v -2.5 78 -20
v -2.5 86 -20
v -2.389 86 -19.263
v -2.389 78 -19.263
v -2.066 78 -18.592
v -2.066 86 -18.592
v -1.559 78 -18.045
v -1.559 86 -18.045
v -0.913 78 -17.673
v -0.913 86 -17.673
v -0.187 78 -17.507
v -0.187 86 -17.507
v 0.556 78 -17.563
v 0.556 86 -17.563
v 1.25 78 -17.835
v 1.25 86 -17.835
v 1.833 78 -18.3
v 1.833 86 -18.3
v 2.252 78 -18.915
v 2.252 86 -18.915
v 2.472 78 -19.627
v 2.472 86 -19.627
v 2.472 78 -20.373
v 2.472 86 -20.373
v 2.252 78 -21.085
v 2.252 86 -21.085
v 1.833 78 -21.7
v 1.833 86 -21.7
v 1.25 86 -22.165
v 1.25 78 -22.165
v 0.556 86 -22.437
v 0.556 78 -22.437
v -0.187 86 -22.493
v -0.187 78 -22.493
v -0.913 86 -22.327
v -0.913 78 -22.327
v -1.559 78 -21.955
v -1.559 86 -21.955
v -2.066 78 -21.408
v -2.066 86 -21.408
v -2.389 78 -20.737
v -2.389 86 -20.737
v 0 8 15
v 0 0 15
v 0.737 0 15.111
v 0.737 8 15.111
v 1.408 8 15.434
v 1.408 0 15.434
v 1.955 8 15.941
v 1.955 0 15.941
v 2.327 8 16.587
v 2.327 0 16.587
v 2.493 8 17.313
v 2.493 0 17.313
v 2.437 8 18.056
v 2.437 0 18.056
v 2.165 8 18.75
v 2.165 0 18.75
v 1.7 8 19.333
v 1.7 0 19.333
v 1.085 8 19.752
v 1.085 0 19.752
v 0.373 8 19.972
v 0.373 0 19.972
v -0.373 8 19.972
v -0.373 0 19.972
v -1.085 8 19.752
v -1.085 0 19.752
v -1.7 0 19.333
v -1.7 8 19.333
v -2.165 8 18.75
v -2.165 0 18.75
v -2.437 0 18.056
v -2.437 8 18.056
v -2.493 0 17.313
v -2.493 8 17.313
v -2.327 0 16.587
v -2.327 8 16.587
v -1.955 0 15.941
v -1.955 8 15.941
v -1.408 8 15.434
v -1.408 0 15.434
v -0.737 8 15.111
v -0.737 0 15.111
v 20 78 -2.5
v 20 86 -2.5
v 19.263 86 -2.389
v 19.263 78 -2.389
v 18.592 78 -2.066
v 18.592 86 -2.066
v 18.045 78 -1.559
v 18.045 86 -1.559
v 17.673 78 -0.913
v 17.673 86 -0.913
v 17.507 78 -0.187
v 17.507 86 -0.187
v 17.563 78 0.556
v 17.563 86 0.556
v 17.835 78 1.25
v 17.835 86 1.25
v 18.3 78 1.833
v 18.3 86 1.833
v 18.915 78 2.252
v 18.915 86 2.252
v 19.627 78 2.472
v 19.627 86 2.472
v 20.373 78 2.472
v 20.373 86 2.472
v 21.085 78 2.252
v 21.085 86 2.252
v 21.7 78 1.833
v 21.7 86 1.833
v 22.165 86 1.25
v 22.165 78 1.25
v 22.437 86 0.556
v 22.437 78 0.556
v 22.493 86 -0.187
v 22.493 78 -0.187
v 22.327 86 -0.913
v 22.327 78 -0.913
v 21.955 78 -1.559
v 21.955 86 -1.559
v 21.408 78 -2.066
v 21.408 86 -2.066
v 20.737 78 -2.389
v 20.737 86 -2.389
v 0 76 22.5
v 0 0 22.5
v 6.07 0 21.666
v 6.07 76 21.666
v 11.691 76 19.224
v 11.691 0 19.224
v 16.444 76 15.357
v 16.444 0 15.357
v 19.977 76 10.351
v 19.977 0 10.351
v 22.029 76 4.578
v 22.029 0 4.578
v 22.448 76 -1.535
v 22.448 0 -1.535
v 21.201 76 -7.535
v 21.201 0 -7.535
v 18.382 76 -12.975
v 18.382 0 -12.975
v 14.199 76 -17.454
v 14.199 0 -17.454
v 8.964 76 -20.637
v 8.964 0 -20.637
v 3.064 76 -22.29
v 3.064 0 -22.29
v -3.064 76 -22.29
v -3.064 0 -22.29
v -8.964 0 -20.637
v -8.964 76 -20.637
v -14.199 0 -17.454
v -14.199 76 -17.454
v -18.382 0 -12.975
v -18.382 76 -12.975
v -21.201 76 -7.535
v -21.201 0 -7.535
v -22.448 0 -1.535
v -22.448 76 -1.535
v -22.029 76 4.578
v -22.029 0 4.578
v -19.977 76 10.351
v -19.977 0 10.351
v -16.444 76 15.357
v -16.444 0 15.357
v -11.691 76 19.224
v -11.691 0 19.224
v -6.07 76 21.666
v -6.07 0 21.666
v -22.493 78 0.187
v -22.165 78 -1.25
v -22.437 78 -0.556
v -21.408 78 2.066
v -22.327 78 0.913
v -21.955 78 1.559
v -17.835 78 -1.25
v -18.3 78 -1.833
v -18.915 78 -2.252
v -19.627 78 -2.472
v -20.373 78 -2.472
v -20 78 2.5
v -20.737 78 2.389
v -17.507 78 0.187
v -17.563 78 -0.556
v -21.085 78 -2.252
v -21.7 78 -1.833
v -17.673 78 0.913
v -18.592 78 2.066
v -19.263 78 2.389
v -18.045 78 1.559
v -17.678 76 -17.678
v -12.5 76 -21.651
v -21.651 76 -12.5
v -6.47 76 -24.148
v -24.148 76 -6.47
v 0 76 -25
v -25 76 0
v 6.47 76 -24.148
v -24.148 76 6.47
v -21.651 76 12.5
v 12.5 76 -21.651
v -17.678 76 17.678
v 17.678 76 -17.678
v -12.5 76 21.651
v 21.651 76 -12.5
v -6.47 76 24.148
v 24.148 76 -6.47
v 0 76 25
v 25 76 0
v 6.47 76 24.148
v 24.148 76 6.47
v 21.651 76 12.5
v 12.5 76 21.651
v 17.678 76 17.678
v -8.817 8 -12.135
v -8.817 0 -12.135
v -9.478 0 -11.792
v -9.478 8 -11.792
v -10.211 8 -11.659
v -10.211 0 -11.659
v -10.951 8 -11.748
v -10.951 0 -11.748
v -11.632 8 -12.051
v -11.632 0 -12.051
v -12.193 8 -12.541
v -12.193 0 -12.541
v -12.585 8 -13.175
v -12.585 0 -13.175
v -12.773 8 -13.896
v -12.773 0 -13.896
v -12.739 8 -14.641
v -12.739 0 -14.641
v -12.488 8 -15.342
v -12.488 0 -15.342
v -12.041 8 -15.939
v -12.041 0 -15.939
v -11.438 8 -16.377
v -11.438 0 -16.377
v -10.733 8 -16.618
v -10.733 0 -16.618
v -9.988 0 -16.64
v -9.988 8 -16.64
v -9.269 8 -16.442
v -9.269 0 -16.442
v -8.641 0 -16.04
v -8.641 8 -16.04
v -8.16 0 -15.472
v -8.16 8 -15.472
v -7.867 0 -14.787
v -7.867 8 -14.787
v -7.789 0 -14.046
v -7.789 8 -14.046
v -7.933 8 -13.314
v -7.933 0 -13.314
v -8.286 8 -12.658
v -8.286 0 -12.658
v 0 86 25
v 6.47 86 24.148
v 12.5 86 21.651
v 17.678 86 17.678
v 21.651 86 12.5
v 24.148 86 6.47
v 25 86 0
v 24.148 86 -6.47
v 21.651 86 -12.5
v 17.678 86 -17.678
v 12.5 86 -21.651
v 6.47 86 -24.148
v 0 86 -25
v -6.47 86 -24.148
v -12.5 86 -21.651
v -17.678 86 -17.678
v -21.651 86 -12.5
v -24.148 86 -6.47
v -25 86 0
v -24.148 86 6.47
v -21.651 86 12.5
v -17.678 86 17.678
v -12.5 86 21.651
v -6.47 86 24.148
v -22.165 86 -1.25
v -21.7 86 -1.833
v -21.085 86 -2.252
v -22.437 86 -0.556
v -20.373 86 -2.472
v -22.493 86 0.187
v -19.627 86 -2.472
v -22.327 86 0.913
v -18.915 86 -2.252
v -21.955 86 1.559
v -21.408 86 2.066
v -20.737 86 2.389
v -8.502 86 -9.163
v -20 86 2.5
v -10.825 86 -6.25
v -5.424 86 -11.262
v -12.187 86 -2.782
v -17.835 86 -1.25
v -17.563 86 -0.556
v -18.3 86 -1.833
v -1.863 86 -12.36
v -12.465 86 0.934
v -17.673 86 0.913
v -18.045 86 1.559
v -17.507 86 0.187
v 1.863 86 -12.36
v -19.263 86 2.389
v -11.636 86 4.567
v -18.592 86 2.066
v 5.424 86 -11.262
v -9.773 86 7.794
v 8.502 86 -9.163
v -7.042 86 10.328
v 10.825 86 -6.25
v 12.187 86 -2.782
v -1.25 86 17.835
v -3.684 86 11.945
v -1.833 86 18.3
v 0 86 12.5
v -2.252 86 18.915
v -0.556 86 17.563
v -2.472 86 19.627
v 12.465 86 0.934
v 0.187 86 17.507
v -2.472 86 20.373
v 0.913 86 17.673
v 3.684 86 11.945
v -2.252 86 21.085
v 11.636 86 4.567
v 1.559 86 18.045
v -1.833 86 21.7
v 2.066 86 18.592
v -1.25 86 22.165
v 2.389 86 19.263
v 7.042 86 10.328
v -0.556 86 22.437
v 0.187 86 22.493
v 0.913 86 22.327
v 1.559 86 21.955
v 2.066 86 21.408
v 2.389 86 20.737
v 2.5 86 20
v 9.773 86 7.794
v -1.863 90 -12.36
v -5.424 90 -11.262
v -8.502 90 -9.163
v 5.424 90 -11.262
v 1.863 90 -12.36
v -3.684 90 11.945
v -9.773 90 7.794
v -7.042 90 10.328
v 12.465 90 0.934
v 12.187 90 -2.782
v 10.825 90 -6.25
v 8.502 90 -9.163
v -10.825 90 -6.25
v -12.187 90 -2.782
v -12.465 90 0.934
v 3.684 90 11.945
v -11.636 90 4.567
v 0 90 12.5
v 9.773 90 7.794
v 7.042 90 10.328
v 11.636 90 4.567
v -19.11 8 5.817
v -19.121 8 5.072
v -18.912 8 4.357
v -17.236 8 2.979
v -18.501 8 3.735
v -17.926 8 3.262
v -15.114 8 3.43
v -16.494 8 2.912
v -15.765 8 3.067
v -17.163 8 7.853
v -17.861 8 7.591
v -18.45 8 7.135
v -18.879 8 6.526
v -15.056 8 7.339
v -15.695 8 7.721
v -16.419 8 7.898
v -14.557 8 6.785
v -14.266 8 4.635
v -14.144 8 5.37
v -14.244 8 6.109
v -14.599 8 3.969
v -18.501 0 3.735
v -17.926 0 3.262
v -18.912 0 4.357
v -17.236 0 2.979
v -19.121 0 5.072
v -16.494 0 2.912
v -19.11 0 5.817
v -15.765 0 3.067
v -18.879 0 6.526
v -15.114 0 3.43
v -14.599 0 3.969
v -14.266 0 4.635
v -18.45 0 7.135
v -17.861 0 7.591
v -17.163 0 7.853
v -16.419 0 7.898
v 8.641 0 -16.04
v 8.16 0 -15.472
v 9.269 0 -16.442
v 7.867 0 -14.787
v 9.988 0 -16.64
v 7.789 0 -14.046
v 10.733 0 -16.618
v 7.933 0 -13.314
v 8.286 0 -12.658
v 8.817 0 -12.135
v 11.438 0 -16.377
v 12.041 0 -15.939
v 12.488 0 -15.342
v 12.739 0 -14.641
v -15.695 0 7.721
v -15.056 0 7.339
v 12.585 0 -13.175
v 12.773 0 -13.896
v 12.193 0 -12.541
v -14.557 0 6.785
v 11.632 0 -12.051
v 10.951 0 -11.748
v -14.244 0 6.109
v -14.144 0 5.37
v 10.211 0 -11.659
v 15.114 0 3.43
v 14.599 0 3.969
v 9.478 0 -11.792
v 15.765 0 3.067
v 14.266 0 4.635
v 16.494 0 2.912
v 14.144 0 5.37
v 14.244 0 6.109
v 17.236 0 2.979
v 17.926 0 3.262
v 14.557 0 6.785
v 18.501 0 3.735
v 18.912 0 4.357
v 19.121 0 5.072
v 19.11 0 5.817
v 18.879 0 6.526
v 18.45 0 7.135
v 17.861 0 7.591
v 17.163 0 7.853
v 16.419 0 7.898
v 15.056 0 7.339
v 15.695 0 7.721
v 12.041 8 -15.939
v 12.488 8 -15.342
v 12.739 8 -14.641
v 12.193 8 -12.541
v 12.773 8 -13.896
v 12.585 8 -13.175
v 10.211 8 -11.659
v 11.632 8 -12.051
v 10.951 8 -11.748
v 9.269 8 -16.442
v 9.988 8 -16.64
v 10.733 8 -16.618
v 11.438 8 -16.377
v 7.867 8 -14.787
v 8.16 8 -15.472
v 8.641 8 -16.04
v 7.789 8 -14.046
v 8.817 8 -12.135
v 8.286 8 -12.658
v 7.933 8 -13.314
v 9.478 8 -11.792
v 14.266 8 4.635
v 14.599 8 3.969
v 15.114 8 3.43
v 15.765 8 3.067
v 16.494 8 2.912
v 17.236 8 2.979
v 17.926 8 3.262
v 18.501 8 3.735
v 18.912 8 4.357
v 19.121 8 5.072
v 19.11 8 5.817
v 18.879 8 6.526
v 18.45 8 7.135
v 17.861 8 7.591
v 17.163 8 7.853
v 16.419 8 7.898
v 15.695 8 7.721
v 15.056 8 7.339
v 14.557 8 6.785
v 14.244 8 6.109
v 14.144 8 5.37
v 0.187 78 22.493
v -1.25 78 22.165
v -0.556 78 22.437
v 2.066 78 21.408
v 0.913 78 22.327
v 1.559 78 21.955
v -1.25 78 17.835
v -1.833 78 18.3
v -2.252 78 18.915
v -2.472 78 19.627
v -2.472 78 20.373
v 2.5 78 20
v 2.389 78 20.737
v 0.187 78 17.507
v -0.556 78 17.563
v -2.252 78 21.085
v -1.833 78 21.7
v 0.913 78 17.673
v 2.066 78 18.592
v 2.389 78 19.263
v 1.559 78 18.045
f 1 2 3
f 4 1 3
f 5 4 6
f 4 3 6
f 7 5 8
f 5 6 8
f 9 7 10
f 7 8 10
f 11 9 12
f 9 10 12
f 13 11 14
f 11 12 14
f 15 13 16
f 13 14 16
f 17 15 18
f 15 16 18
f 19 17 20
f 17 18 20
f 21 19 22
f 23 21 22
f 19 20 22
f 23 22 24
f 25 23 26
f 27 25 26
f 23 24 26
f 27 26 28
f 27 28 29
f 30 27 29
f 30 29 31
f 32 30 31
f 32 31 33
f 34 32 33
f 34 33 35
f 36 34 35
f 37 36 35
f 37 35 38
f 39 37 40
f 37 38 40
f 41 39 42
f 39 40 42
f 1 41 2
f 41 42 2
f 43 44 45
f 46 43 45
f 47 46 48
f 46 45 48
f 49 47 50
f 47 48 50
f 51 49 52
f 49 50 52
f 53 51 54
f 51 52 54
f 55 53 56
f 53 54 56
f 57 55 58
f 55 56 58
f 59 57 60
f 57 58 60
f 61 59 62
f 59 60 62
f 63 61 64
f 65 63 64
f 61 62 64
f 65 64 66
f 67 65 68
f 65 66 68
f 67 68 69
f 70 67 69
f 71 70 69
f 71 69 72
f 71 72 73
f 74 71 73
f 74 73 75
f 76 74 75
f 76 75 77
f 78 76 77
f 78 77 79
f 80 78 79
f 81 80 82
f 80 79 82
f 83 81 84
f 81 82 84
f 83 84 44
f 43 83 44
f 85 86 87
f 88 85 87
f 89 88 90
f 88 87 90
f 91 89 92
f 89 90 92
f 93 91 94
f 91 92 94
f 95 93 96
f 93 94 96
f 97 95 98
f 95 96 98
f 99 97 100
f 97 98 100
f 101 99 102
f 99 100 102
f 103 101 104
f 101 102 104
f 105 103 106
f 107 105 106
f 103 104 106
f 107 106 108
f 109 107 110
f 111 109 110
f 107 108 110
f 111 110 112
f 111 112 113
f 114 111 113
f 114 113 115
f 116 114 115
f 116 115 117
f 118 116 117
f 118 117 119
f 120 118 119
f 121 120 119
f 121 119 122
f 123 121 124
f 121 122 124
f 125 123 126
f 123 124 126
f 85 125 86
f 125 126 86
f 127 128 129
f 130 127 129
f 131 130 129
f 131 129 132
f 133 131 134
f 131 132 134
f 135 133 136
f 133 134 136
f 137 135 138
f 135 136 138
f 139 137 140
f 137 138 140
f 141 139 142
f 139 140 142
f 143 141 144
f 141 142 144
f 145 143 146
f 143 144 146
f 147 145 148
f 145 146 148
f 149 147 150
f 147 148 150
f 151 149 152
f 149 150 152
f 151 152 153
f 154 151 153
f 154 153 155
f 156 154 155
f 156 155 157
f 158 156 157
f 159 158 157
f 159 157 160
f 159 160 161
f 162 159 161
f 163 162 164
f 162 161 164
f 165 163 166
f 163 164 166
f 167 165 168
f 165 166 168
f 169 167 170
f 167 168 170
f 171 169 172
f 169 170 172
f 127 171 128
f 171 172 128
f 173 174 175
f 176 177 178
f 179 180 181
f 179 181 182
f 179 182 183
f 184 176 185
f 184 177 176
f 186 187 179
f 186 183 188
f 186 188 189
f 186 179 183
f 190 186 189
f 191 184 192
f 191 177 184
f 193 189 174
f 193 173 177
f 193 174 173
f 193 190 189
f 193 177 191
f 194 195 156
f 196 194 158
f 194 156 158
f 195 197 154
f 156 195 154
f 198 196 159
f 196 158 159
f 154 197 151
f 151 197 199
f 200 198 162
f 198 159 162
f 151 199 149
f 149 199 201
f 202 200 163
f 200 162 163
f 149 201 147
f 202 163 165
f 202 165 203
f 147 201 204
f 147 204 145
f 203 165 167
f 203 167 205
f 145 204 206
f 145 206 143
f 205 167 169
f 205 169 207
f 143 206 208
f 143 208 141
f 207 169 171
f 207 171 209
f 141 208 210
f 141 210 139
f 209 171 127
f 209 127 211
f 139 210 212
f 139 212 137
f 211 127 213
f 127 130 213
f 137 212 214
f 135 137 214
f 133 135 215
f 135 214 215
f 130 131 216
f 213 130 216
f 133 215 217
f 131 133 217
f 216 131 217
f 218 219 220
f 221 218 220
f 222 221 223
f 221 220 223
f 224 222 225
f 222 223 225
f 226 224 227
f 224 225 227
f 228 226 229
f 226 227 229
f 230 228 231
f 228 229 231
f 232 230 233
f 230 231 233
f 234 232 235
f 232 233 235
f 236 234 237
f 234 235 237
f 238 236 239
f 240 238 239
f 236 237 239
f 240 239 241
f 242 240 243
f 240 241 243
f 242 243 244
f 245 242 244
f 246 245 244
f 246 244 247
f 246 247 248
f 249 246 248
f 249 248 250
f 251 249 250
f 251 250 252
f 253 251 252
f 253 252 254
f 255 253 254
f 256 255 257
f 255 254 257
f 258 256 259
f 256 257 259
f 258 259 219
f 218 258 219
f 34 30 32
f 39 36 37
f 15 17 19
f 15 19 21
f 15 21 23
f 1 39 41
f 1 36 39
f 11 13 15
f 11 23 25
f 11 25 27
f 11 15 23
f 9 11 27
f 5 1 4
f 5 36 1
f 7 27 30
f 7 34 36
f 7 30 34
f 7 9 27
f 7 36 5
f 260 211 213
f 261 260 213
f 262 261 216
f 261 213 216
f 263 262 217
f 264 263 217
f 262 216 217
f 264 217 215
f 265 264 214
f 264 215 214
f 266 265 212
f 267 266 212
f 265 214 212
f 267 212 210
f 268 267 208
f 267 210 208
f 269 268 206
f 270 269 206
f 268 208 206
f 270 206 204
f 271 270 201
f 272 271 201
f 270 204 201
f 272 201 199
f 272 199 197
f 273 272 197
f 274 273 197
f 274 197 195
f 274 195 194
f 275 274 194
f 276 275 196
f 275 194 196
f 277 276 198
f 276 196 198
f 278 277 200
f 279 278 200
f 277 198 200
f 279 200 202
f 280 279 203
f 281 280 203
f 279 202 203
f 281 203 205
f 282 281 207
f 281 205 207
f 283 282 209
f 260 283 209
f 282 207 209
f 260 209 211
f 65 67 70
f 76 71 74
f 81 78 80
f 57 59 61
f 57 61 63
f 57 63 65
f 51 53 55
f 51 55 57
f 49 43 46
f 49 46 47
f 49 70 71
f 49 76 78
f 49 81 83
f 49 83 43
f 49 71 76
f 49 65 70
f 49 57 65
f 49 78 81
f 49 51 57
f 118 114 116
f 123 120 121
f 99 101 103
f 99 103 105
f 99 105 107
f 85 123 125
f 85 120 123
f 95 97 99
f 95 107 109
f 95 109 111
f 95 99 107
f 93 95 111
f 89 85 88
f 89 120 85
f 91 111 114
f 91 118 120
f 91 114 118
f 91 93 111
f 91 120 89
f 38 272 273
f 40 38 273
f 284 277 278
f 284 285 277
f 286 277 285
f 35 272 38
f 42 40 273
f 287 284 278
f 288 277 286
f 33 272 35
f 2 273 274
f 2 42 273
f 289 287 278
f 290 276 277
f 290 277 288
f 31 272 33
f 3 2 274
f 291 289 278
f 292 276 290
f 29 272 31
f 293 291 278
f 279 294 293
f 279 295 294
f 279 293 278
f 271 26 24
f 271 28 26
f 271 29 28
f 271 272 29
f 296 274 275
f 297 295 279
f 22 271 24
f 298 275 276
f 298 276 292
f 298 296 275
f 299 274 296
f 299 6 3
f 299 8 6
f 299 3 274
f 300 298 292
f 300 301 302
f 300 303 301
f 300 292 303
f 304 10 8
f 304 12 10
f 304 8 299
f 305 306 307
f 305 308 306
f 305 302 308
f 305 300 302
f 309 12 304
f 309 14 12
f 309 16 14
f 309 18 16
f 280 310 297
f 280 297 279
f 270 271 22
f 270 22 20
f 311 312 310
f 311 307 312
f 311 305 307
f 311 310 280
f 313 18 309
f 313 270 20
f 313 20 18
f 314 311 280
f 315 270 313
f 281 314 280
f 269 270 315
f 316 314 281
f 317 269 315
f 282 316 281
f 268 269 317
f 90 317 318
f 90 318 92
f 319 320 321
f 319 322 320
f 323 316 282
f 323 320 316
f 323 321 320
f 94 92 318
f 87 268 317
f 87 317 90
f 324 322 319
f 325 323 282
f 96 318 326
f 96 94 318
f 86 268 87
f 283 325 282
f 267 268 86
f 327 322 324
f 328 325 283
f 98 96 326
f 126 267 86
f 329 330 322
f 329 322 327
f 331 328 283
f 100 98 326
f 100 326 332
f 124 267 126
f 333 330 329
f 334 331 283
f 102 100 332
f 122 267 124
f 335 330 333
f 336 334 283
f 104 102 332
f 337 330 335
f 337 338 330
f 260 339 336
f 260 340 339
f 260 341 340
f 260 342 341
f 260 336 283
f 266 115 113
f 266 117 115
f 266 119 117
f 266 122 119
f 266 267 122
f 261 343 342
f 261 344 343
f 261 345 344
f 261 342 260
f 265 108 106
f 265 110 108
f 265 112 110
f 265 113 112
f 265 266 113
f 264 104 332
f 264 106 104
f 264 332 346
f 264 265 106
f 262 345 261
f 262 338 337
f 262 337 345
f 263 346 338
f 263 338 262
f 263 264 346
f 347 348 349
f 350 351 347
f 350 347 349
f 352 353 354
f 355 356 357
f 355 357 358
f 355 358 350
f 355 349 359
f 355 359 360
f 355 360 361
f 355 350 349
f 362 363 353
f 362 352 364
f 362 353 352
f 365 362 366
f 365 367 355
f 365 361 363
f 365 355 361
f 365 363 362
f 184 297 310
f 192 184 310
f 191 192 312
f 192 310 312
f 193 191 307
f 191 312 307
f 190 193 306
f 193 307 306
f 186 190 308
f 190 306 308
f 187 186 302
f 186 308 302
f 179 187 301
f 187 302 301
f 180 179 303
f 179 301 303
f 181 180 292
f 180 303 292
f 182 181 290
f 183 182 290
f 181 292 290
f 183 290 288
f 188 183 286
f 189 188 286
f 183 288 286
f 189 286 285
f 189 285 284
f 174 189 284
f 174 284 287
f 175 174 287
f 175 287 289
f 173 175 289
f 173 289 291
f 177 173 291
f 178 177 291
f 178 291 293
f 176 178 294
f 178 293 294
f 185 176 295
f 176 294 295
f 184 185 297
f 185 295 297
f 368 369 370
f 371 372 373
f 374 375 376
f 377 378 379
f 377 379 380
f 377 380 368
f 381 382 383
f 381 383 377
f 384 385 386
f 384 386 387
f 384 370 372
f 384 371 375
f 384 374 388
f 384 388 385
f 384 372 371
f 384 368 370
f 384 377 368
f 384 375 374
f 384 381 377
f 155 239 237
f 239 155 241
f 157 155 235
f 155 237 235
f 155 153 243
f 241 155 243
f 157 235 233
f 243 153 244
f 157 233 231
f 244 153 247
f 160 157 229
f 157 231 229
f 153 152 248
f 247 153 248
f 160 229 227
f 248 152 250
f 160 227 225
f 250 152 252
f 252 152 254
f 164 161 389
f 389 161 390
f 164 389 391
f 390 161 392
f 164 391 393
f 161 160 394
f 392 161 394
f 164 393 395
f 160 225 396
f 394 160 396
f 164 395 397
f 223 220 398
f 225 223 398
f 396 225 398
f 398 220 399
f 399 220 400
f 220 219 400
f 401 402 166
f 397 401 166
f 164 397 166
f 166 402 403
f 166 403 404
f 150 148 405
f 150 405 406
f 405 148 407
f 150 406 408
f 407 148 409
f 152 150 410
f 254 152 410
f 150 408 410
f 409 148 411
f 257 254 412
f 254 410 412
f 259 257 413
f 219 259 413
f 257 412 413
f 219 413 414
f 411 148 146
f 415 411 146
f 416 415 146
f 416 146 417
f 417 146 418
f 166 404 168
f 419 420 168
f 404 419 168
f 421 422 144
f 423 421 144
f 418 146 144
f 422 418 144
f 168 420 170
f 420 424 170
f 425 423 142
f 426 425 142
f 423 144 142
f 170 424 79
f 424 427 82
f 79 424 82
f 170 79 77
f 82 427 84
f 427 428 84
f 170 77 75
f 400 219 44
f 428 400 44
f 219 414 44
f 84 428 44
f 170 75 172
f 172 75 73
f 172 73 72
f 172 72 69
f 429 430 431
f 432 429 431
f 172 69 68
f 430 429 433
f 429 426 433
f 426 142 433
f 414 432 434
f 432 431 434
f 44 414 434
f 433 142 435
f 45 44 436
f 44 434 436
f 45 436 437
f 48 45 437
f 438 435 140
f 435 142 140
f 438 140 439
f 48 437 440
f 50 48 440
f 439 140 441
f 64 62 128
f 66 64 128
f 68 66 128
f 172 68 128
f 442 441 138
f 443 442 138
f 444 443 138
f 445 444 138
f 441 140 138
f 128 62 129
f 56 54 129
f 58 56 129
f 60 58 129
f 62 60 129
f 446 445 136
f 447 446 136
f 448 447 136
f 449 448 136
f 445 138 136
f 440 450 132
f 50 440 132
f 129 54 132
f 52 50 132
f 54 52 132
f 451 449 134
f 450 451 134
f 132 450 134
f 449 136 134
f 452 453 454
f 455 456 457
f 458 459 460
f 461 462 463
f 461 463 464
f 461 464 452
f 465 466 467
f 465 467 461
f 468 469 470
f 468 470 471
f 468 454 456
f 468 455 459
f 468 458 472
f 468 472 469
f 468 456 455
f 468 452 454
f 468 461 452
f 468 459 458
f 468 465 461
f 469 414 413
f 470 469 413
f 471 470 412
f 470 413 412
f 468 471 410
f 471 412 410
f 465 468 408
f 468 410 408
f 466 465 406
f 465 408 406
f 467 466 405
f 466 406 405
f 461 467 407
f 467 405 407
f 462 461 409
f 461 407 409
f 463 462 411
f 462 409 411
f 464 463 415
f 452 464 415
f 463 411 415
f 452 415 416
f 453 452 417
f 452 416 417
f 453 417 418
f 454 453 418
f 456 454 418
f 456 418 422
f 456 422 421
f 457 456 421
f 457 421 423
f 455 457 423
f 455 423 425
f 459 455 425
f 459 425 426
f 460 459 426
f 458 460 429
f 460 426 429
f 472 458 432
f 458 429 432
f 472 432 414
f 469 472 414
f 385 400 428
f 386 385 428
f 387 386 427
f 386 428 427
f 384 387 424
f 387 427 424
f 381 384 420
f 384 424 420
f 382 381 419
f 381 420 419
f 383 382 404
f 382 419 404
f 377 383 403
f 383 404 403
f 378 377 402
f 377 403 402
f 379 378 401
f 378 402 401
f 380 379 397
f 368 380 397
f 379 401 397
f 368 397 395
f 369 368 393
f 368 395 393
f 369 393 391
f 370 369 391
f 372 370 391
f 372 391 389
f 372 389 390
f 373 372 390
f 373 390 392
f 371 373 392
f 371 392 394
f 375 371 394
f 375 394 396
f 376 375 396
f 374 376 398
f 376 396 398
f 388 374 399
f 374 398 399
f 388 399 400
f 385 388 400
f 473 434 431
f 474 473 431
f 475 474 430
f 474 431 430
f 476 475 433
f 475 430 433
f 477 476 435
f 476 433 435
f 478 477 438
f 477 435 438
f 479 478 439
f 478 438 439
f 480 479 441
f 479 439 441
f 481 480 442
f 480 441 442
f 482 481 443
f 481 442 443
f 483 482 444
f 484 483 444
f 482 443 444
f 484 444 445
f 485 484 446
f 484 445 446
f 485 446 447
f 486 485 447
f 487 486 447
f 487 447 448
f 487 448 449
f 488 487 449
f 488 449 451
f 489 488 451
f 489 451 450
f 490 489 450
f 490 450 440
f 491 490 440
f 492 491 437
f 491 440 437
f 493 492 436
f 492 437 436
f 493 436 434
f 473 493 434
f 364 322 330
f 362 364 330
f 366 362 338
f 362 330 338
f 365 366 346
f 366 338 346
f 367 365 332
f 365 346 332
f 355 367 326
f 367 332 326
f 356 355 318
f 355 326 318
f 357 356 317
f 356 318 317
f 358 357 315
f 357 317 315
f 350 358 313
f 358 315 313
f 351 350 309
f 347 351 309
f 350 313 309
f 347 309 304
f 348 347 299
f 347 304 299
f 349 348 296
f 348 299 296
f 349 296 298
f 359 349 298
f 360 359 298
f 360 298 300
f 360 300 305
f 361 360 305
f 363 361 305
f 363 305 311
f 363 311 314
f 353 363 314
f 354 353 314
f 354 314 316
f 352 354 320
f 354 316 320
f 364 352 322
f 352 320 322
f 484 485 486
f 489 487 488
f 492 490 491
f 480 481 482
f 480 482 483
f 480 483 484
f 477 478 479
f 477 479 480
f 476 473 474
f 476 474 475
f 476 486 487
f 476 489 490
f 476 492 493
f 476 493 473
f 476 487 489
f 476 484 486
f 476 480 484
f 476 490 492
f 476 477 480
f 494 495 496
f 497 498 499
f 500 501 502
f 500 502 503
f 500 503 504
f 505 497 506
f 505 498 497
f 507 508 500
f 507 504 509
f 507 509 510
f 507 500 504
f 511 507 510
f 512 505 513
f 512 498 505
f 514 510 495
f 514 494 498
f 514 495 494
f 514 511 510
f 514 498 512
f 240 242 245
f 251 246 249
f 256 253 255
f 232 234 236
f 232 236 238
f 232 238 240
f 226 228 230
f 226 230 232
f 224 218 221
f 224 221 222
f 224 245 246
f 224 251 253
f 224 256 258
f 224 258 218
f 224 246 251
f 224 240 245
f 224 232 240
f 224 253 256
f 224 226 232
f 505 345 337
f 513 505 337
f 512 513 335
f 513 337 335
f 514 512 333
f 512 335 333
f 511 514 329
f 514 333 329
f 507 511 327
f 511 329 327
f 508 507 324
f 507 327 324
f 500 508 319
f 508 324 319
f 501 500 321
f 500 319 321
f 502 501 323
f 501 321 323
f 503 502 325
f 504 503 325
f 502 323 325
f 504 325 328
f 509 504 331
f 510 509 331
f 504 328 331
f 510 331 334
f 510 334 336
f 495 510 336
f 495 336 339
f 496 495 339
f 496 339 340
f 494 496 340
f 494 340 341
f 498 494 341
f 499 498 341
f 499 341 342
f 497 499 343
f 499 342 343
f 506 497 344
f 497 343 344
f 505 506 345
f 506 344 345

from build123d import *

# Parameters (mm, degrees)
SKETCH1_R           = 22.5
BOSS_EXTRUDE1_DEPTH = 76
SKETCH2_R           = 25
BOSS_EXTRUDE2_DEPTH = 10
SKETCH3_R           = 12.5
BOSS_EXTRUDE3_DEPTH = 4
SKETCH4_R           = 2.5
CUT_EXTRUDE1_DEPTH  = 8
CIRPATTERN1_COUNT   = 4
SKETCH5_R           = 2.5
CUT_EXTRUDE2_DEPTH  = 8
CIRPATTERN2_COUNT   = 5


with BuildPart() as part:
    # Sketch1 → Boss-Extrude1 (new body)
    with BuildSketch(Plane(origin=(0, 0, 0), x_dir=(1, 0, 0), z_dir=(0, 1, 0))):
        with Locations(Location((0, 0, 0), (0, 0, 270))):
            Circle(SKETCH1_R)
    extrude(amount=BOSS_EXTRUDE1_DEPTH)

    # Sketch2 → Boss-Extrude2 (add)
    with BuildSketch(Plane(origin=(0, 76, 0), x_dir=(1, 0, 0), z_dir=(0, 1, 0))):
        with Locations(Location((0, 0, 0), (0, 0, 270))):
            Circle(SKETCH2_R)
    extrude(amount=BOSS_EXTRUDE2_DEPTH)

    # Sketch3 → Boss-Extrude3 (add)
    with BuildSketch(Plane(origin=(0, 86, 0), x_dir=(1, 0, 0), z_dir=(0, 1, 0))):
        with Locations(Location((0, 0, 0), (0, 0, 270))):
            Circle(SKETCH3_R)
    extrude(amount=BOSS_EXTRUDE3_DEPTH)

    # Sketch4 → Cut-Extrude1 (cut)
    with BuildSketch(Plane(origin=(0, 86, 0), x_dir=(1, 0, 0), z_dir=(0, 1, 0))):
        with Locations(Location((-20, 0, 0), (0, 0, 270))):
            Circle(SKETCH4_R)
    cut_extrude1 = extrude(amount=-CUT_EXTRUDE1_DEPTH, mode=Mode.SUBTRACT)

    # CirPattern1: Cut-Extrude1 ×4 about axis
    cirpattern1_axis = Axis((0, 0, 0), (0, 1, 0))
    for i in range(1, CIRPATTERN1_COUNT):
        add(cut_extrude1.rotate(cirpattern1_axis, i * 360 / CIRPATTERN1_COUNT), mode=Mode.SUBTRACT)

    # Sketch5 → Cut-Extrude2 (cut)
    with BuildSketch(Plane.XZ):
        with Locations(Location((0, 17.5, 0), (0, 0, 270))):
            Circle(SKETCH5_R)
    cut_extrude2 = extrude(amount=-CUT_EXTRUDE2_DEPTH, mode=Mode.SUBTRACT)

    # CirPattern2: Cut-Extrude2 ×5 about axis
    cirpattern2_axis = Axis((0, 0, 0), (0, 1, 0))
    for i in range(1, CIRPATTERN2_COUNT):
        add(cut_extrude2.rotate(cirpattern2_axis, i * 360 / CIRPATTERN2_COUNT), mode=Mode.SUBTRACT)


solid = part.part
